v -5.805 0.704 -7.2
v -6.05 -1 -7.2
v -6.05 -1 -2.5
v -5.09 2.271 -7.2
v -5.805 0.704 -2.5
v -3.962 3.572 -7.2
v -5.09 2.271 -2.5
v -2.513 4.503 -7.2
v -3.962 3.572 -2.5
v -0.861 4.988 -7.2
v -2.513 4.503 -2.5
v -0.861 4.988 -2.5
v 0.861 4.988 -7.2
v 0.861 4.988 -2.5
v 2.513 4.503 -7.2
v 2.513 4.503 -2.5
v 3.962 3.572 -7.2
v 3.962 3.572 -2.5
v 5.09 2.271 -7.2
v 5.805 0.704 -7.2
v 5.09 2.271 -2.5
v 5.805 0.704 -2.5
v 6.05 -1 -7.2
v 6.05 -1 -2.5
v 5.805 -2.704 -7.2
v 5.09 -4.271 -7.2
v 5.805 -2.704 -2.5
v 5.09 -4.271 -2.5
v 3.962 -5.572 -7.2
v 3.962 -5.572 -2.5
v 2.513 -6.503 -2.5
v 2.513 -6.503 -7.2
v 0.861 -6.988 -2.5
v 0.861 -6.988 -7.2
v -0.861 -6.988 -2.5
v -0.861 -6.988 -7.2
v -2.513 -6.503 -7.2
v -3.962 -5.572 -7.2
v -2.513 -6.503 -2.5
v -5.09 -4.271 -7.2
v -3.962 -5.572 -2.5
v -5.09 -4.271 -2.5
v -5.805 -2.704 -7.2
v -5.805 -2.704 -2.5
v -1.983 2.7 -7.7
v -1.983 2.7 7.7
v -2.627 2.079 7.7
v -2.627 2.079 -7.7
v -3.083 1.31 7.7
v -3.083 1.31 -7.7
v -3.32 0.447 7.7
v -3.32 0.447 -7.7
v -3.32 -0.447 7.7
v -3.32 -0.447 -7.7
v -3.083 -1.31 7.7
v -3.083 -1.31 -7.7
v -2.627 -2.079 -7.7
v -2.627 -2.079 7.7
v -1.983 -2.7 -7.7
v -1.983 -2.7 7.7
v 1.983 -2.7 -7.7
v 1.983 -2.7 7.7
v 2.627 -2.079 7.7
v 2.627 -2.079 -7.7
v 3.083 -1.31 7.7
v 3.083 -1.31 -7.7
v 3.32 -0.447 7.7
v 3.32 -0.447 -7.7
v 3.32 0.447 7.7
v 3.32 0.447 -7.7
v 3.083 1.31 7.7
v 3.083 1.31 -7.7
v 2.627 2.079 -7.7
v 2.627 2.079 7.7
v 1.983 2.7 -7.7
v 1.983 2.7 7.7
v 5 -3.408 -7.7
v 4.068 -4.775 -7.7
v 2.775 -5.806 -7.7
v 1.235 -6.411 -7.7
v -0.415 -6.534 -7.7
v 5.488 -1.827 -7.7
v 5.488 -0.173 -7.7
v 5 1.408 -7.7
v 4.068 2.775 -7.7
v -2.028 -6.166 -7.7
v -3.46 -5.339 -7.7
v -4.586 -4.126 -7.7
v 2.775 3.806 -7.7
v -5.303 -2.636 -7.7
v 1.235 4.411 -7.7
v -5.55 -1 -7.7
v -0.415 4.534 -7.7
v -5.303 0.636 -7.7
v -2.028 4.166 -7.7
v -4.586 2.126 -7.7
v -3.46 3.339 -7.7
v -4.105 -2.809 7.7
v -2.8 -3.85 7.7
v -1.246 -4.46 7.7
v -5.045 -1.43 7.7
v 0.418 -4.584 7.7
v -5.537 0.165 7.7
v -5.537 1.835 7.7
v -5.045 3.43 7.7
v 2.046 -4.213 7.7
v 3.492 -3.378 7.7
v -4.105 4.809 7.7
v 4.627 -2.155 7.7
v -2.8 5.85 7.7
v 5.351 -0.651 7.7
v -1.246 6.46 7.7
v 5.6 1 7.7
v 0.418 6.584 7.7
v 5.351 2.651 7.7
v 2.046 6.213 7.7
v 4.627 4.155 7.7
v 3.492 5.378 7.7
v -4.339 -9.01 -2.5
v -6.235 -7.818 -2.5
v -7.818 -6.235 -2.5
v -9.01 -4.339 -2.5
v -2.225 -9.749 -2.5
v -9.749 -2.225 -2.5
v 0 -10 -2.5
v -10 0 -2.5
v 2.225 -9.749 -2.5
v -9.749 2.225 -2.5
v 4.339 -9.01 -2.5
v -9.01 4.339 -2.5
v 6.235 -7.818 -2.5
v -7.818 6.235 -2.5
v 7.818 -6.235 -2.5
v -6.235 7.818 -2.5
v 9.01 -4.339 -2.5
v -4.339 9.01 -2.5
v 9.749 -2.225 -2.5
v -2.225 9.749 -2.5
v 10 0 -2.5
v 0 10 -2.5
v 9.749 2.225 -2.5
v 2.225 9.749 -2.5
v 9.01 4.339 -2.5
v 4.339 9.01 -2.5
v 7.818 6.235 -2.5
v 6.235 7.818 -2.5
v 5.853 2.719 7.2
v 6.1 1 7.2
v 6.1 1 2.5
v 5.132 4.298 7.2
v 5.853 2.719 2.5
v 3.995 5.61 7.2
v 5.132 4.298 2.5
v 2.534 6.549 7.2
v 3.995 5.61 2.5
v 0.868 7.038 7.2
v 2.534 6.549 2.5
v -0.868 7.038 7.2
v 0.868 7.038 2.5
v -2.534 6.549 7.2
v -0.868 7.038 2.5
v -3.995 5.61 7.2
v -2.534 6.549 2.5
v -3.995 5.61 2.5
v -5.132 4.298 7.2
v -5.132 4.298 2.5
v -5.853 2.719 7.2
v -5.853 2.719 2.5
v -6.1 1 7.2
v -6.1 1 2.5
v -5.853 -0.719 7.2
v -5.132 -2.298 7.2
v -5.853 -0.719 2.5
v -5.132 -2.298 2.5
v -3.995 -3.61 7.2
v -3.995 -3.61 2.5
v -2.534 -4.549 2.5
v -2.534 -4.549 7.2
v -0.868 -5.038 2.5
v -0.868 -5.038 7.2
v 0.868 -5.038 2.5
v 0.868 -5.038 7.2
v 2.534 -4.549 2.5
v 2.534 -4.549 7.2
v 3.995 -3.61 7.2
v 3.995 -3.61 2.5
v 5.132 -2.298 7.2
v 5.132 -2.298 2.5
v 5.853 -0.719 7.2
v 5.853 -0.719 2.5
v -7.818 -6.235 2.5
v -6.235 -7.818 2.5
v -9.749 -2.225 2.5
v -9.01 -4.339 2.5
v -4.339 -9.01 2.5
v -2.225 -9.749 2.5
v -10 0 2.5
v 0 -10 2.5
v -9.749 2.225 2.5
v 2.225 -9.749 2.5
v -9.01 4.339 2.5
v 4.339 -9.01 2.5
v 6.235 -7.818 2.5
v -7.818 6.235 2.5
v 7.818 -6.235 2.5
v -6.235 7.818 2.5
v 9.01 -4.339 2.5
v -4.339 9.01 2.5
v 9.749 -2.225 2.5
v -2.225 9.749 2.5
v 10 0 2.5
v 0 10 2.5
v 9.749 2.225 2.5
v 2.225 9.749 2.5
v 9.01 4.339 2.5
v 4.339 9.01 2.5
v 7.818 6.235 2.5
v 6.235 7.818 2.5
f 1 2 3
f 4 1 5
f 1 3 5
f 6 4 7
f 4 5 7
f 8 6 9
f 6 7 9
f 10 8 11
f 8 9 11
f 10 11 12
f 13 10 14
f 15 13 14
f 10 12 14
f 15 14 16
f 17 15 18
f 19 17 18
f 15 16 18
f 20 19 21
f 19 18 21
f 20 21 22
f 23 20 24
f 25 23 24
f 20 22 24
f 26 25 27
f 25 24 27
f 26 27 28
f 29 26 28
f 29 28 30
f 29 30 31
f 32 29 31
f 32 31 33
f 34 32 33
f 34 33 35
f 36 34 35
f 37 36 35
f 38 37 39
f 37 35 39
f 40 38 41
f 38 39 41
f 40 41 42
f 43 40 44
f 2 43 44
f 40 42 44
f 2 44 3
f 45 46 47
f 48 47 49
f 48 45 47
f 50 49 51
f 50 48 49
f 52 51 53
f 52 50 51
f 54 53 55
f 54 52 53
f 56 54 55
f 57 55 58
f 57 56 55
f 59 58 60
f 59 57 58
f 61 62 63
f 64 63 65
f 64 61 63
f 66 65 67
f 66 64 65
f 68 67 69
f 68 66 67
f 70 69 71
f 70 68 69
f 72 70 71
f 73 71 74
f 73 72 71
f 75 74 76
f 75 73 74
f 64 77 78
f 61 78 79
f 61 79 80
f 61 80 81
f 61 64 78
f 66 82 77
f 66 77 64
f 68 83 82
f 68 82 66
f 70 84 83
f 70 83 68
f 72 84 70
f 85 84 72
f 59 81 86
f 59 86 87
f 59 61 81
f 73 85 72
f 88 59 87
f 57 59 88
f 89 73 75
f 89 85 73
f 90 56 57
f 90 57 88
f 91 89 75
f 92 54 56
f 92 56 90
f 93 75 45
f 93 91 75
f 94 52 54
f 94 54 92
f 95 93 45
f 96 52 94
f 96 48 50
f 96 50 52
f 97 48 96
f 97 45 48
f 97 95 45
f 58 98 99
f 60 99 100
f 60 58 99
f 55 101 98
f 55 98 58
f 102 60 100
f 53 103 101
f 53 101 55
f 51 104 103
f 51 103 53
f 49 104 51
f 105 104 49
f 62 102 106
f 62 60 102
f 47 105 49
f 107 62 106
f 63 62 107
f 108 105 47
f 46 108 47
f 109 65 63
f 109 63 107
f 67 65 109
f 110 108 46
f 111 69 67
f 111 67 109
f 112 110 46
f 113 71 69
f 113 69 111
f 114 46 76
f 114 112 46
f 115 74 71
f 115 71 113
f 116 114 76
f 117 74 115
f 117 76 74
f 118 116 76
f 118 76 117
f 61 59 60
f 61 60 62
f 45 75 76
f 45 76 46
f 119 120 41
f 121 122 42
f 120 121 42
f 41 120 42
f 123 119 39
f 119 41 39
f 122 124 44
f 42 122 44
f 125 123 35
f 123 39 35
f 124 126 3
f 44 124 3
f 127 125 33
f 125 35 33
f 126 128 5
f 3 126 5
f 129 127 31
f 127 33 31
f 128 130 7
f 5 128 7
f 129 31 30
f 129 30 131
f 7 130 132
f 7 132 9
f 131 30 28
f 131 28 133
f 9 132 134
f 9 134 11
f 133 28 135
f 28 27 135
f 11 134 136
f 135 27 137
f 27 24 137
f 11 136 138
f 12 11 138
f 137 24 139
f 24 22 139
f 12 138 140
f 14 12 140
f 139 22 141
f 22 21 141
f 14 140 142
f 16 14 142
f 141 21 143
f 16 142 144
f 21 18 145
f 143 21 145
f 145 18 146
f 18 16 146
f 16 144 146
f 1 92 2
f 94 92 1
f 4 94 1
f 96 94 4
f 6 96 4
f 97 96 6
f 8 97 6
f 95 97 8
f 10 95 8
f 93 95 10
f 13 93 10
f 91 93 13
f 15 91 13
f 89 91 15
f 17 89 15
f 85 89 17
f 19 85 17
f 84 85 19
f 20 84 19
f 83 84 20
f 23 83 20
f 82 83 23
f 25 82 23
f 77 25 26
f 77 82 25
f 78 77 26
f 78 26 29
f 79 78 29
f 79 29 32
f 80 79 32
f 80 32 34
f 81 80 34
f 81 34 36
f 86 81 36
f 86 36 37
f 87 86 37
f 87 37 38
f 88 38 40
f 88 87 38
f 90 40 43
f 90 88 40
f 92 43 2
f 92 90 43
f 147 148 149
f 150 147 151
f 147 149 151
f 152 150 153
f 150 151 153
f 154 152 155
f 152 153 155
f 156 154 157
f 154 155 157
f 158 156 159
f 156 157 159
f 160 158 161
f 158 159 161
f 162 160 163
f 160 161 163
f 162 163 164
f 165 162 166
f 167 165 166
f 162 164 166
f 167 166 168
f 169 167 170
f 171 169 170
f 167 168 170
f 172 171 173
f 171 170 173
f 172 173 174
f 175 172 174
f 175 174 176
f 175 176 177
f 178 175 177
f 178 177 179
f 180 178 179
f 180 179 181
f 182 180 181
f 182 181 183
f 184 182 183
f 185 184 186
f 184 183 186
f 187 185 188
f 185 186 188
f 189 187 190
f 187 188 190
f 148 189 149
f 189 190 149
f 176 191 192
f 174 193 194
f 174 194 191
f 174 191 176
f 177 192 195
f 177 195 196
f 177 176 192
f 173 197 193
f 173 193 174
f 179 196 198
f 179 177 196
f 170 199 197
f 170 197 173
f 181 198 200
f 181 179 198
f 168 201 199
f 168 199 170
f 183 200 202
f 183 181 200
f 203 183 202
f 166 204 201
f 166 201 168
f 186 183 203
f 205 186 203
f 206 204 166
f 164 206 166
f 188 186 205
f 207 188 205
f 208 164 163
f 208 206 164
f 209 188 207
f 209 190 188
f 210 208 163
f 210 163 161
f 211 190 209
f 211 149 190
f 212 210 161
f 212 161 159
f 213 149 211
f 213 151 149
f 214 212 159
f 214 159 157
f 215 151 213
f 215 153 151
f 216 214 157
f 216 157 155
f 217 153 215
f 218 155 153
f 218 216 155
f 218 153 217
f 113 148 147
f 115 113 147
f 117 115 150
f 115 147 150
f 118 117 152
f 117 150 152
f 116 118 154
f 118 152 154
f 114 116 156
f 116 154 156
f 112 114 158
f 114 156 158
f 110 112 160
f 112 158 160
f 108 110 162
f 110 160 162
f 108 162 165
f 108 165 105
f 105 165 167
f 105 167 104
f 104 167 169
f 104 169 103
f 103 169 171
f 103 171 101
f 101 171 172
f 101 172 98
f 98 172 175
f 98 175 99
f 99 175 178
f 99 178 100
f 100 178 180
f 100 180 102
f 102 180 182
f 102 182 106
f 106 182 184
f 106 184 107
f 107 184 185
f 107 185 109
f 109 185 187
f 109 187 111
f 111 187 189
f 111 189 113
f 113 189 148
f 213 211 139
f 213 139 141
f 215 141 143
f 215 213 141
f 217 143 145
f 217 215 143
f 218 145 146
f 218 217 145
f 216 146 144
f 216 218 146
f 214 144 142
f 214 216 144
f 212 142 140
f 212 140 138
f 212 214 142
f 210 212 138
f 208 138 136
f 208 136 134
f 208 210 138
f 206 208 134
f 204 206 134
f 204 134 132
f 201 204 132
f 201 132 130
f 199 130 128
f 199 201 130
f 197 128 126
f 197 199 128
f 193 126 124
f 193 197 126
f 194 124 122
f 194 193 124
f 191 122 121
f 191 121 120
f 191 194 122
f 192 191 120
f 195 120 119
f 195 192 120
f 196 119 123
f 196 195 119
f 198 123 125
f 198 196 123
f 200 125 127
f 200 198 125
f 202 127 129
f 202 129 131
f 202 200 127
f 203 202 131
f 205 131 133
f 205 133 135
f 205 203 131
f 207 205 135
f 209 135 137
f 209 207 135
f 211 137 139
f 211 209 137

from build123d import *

# Parameters (mm, degrees)
SKETCH6_R               = 6
BOSS_EXTRUDE4_DEPTH     = 2.5
SKETCH7_R               = 6.1
BOSS_EXTRUDE5_DEPTH     = 5.2
SKETCH8_R               = 6.05
BOSS_EXTRUDE6_DEPTH     = 5.2
SKETCH13_R              = 10
BOSS_EXTRUDE7_DEPTH     = 5
CUT_EXTRUDE1_DEPTH      = 6.2
CUT_EXTRUDE1_DEPTH_BACK = 11.2
CHAMFER1_SIZE           = 0.5


with BuildPart() as part:
    # Sketch6 → Boss-Extrude4 (new body, symmetric)
    with BuildSketch(Plane.XY):
        Circle(SKETCH6_R)
    extrude(amount=BOSS_EXTRUDE4_DEPTH, both=True)

    # Sketch7 → Boss-Extrude5 (add)
    with BuildSketch(Plane.XY.offset(2.5)):
        with Locations((0, 1)):
            Circle(SKETCH7_R)
    extrude(amount=BOSS_EXTRUDE5_DEPTH)

    # Sketch8 → Boss-Extrude6 (add)
    with BuildSketch(Plane(origin=(0, 0, -2.5), x_dir=(-1, 0, 0), z_dir=(0, 0, -1))):
        with Locations((0, -1)):
            Circle(SKETCH8_R)
    extrude(amount=BOSS_EXTRUDE6_DEPTH)

    # Sketch13 → Boss-Extrude7 (add)
    with BuildSketch(Plane.XY.offset(2.5)):
        Circle(SKETCH13_R)
    extrude(amount=-BOSS_EXTRUDE7_DEPTH)

    # Sketch11 → Cut-Extrude1 (cut, two sides)
    with BuildSketch(Plane.XY.offset(2.5)) as cut_extrude1_sk:
        with BuildLine():
            Line((-1.983053202, -2.7), (1.983053202, -2.7))
            ThreePointArc((1.983053202, -2.7), (3.35, 0), (1.983053202, 2.7))
            Line((1.983053202, 2.7), (-1.983053202, 2.7))
            ThreePointArc((-1.983053202, 2.7), (-3.35, 0), (-1.983053202, -2.7))
        make_face()
    extrude(amount=CUT_EXTRUDE1_DEPTH, mode=Mode.SUBTRACT)
    extrude(cut_extrude1_sk.sketch, amount=-CUT_EXTRUDE1_DEPTH_BACK, mode=Mode.SUBTRACT)

    # Chamfer1
    chamfer1_edges = [part.edges().sort_by_distance(p)[0] for p in [
        (6.05, -1, -7.7),
        (-6.1, 1, 7.7),
    ]]
    chamfer(chamfer1_edges, length=CHAMFER1_SIZE)


solid = part.part
